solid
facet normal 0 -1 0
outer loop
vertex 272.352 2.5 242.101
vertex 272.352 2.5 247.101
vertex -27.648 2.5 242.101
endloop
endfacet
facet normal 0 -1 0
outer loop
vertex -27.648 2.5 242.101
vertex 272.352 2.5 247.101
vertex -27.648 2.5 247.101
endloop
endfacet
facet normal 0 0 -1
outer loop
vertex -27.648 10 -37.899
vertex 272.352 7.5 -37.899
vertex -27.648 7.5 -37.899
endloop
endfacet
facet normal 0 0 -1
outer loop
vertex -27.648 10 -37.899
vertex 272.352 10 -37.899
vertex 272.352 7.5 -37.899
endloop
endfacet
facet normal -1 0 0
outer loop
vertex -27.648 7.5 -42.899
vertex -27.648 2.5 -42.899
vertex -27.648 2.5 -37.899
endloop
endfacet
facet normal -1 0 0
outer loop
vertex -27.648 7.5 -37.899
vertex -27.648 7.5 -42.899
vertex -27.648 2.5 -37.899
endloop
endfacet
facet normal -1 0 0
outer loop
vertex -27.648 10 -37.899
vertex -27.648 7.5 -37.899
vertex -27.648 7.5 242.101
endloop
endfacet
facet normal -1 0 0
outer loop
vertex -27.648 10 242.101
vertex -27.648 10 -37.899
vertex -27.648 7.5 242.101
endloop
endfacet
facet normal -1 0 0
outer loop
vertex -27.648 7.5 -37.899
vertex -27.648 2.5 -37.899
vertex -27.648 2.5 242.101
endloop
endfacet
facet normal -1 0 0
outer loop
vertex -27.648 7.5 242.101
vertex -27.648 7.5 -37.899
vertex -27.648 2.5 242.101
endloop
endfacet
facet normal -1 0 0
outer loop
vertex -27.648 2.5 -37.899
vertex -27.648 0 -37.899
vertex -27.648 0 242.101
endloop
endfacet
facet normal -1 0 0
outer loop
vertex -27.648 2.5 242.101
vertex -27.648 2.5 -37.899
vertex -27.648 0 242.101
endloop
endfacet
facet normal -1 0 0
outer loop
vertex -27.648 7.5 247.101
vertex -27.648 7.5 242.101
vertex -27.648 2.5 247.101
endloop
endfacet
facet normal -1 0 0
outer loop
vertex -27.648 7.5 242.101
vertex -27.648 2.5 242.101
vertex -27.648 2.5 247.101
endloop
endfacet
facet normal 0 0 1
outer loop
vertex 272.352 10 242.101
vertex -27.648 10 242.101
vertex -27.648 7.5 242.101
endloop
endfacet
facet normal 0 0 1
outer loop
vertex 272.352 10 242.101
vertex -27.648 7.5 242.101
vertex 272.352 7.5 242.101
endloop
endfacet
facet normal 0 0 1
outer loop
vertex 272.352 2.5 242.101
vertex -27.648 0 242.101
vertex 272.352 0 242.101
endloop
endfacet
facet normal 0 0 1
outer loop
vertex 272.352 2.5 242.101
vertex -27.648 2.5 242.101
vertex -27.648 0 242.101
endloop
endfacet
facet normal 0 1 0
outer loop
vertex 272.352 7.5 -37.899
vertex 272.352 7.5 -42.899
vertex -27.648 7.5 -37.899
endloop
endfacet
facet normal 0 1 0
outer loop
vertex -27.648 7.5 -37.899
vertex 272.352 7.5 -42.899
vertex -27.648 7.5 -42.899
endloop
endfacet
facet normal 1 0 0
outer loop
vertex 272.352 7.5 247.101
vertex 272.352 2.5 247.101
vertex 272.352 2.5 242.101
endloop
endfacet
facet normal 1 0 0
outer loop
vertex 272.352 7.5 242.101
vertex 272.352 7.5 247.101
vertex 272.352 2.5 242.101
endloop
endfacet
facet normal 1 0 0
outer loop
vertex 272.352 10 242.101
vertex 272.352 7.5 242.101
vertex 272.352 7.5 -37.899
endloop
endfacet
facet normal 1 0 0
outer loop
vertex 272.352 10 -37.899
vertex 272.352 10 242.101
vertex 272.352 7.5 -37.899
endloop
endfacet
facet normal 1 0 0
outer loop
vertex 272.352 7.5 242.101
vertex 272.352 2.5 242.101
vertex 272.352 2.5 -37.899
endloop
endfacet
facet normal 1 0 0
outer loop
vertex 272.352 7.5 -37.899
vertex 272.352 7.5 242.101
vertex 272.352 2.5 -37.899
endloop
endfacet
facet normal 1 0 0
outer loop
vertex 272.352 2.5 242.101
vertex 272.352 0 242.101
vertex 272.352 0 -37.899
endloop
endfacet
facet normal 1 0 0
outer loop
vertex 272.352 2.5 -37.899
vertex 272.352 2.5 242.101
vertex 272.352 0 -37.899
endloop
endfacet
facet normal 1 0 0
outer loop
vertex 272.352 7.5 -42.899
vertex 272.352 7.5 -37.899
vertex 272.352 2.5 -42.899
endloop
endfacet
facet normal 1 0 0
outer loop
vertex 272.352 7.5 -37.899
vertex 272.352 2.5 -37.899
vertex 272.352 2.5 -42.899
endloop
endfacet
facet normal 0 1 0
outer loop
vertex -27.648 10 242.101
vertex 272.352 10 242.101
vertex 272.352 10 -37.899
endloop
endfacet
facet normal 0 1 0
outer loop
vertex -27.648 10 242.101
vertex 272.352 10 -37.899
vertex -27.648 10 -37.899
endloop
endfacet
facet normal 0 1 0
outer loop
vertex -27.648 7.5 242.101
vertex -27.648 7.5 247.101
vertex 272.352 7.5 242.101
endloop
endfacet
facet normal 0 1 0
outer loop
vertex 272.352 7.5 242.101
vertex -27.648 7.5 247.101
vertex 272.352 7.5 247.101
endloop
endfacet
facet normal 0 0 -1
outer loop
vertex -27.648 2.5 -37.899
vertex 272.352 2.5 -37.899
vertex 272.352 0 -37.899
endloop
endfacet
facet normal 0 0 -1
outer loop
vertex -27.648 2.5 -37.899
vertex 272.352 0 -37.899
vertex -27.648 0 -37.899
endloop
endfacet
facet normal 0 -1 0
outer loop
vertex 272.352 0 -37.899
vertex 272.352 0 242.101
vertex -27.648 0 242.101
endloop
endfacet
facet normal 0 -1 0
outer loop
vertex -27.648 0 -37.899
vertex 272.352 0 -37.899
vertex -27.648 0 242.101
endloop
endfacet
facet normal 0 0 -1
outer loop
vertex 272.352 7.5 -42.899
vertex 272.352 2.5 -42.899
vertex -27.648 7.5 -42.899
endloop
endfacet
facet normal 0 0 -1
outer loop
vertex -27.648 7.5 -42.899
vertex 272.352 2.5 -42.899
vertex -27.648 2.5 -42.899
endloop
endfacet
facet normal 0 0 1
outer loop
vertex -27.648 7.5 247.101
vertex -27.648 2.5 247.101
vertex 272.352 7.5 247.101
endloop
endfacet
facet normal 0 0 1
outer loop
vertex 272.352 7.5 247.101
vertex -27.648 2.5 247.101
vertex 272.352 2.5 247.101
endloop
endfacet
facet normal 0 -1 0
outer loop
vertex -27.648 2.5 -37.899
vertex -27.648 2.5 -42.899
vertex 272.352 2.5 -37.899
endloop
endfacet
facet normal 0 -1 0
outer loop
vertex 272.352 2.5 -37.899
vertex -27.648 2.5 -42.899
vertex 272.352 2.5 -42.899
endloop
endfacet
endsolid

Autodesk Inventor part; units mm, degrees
ref_plane "YZ Plane" through (0, 0, 0) normal (1, 0, 0) x (0, 1, 0)
ref_plane "XZ Plane" through (0, 0, 0) normal (0, 1, 0) x (-1, 0, 0)
ref_plane "XY Plane" through (0, 0, 0) normal (0, 0, 1) x (1, 0, 0)
sketch "Skizze2" plane through (0, 0, 0) normal (0, 1, 0) x (-1, 0, 0)
  line L0 (27.6477, 247.101) -> (-272.3523, 247.101)
  line L1 (-272.3523, 247.101) -> (-272.3523, -42.899)
  line L2 (-272.3523, -42.899) -> (27.6477, -42.899)
  line L3 (27.6477, -42.899) -> (27.6477, 247.101)
  point P0 (0, 0)
  dimension "d1" = 290
  dimension "d2" = 300
extrude "Extrusion1" add sketch "Skizze2" along normal blind 10
sketch "Skizze3" plane through (-27.6477, 0, 247.101) normal (0, 0, 1) x (1, 0, 0)
  point P0 (27.6477, 0)
sketch "Skizze4" plane through (-27.6477, 0, 247.101) normal (0, 0, 1) x (1, 0, 0)
  line L0 (0, 10) -> (300, 10) projected
  line L1 (0, 0) -> (0, 10) projected
  line L2 (300, 0) -> (300, 10) projected
  line L3 (0, 7.5) -> (300, 7.5)
  line L4 (300, 7.5) -> (300, 2.5)
  line L5 (300, 2.5) -> (0, 2.5)
  line L6 (0, 2.5) -> (0, 7.5)
  line L7 (0, 0) -> (300, 0) projected
  line L8 (0, 10) -> (300, 10)
  line L9 (300, 10) -> (300, 0)
  line L10 (300, 0) -> (0, 0)
  line L11 (0, 0) -> (0, 10)
  dimension "d8" = 2.5
  dimension "d9" = 2.5
extrude "Extrusion2" cut sketch "Skizze4" against normal blind 5 contours L0 L2 L3 L1 | L5 L2 L7 L1
sketch "Skizze5" plane through (272.3523, 0, -42.899) normal (0, 0, -1) x (-1, 0, 0)
  line L0 (0, 0) -> (0, 10) projected
  line L1 (0, 7.5) -> (300, 7.5)
  line L2 (300, 7.5) -> (300, 2.5)
  line L3 (300, 2.5) -> (0, 2.5)
  line L4 (0, 2.5) -> (0, 7.5)
  line L5 (0, 10) -> (300, 10) projected
  line L6 (0, 0) -> (300, 0) projected
  line L7 (300, 10) -> (0, 10) projected
  line L8 (300, 10) -> (0, 10)
  line L9 (0, 10) -> (0, 0)
  line L10 (0, 0) -> (300, 0)
  line L11 (300, 0) -> (300, 10)
  point P0 (272.3523, 0)
  dimension "d12" = 2.5
  dimension "d13" = 2.5
extrude "Extrusion3" cut sketch "Skizze5" against normal blind 5 contours L0 L3 L11 L6 | L0 L5 L11 L1
properties material "Holz (Ahorn)"
